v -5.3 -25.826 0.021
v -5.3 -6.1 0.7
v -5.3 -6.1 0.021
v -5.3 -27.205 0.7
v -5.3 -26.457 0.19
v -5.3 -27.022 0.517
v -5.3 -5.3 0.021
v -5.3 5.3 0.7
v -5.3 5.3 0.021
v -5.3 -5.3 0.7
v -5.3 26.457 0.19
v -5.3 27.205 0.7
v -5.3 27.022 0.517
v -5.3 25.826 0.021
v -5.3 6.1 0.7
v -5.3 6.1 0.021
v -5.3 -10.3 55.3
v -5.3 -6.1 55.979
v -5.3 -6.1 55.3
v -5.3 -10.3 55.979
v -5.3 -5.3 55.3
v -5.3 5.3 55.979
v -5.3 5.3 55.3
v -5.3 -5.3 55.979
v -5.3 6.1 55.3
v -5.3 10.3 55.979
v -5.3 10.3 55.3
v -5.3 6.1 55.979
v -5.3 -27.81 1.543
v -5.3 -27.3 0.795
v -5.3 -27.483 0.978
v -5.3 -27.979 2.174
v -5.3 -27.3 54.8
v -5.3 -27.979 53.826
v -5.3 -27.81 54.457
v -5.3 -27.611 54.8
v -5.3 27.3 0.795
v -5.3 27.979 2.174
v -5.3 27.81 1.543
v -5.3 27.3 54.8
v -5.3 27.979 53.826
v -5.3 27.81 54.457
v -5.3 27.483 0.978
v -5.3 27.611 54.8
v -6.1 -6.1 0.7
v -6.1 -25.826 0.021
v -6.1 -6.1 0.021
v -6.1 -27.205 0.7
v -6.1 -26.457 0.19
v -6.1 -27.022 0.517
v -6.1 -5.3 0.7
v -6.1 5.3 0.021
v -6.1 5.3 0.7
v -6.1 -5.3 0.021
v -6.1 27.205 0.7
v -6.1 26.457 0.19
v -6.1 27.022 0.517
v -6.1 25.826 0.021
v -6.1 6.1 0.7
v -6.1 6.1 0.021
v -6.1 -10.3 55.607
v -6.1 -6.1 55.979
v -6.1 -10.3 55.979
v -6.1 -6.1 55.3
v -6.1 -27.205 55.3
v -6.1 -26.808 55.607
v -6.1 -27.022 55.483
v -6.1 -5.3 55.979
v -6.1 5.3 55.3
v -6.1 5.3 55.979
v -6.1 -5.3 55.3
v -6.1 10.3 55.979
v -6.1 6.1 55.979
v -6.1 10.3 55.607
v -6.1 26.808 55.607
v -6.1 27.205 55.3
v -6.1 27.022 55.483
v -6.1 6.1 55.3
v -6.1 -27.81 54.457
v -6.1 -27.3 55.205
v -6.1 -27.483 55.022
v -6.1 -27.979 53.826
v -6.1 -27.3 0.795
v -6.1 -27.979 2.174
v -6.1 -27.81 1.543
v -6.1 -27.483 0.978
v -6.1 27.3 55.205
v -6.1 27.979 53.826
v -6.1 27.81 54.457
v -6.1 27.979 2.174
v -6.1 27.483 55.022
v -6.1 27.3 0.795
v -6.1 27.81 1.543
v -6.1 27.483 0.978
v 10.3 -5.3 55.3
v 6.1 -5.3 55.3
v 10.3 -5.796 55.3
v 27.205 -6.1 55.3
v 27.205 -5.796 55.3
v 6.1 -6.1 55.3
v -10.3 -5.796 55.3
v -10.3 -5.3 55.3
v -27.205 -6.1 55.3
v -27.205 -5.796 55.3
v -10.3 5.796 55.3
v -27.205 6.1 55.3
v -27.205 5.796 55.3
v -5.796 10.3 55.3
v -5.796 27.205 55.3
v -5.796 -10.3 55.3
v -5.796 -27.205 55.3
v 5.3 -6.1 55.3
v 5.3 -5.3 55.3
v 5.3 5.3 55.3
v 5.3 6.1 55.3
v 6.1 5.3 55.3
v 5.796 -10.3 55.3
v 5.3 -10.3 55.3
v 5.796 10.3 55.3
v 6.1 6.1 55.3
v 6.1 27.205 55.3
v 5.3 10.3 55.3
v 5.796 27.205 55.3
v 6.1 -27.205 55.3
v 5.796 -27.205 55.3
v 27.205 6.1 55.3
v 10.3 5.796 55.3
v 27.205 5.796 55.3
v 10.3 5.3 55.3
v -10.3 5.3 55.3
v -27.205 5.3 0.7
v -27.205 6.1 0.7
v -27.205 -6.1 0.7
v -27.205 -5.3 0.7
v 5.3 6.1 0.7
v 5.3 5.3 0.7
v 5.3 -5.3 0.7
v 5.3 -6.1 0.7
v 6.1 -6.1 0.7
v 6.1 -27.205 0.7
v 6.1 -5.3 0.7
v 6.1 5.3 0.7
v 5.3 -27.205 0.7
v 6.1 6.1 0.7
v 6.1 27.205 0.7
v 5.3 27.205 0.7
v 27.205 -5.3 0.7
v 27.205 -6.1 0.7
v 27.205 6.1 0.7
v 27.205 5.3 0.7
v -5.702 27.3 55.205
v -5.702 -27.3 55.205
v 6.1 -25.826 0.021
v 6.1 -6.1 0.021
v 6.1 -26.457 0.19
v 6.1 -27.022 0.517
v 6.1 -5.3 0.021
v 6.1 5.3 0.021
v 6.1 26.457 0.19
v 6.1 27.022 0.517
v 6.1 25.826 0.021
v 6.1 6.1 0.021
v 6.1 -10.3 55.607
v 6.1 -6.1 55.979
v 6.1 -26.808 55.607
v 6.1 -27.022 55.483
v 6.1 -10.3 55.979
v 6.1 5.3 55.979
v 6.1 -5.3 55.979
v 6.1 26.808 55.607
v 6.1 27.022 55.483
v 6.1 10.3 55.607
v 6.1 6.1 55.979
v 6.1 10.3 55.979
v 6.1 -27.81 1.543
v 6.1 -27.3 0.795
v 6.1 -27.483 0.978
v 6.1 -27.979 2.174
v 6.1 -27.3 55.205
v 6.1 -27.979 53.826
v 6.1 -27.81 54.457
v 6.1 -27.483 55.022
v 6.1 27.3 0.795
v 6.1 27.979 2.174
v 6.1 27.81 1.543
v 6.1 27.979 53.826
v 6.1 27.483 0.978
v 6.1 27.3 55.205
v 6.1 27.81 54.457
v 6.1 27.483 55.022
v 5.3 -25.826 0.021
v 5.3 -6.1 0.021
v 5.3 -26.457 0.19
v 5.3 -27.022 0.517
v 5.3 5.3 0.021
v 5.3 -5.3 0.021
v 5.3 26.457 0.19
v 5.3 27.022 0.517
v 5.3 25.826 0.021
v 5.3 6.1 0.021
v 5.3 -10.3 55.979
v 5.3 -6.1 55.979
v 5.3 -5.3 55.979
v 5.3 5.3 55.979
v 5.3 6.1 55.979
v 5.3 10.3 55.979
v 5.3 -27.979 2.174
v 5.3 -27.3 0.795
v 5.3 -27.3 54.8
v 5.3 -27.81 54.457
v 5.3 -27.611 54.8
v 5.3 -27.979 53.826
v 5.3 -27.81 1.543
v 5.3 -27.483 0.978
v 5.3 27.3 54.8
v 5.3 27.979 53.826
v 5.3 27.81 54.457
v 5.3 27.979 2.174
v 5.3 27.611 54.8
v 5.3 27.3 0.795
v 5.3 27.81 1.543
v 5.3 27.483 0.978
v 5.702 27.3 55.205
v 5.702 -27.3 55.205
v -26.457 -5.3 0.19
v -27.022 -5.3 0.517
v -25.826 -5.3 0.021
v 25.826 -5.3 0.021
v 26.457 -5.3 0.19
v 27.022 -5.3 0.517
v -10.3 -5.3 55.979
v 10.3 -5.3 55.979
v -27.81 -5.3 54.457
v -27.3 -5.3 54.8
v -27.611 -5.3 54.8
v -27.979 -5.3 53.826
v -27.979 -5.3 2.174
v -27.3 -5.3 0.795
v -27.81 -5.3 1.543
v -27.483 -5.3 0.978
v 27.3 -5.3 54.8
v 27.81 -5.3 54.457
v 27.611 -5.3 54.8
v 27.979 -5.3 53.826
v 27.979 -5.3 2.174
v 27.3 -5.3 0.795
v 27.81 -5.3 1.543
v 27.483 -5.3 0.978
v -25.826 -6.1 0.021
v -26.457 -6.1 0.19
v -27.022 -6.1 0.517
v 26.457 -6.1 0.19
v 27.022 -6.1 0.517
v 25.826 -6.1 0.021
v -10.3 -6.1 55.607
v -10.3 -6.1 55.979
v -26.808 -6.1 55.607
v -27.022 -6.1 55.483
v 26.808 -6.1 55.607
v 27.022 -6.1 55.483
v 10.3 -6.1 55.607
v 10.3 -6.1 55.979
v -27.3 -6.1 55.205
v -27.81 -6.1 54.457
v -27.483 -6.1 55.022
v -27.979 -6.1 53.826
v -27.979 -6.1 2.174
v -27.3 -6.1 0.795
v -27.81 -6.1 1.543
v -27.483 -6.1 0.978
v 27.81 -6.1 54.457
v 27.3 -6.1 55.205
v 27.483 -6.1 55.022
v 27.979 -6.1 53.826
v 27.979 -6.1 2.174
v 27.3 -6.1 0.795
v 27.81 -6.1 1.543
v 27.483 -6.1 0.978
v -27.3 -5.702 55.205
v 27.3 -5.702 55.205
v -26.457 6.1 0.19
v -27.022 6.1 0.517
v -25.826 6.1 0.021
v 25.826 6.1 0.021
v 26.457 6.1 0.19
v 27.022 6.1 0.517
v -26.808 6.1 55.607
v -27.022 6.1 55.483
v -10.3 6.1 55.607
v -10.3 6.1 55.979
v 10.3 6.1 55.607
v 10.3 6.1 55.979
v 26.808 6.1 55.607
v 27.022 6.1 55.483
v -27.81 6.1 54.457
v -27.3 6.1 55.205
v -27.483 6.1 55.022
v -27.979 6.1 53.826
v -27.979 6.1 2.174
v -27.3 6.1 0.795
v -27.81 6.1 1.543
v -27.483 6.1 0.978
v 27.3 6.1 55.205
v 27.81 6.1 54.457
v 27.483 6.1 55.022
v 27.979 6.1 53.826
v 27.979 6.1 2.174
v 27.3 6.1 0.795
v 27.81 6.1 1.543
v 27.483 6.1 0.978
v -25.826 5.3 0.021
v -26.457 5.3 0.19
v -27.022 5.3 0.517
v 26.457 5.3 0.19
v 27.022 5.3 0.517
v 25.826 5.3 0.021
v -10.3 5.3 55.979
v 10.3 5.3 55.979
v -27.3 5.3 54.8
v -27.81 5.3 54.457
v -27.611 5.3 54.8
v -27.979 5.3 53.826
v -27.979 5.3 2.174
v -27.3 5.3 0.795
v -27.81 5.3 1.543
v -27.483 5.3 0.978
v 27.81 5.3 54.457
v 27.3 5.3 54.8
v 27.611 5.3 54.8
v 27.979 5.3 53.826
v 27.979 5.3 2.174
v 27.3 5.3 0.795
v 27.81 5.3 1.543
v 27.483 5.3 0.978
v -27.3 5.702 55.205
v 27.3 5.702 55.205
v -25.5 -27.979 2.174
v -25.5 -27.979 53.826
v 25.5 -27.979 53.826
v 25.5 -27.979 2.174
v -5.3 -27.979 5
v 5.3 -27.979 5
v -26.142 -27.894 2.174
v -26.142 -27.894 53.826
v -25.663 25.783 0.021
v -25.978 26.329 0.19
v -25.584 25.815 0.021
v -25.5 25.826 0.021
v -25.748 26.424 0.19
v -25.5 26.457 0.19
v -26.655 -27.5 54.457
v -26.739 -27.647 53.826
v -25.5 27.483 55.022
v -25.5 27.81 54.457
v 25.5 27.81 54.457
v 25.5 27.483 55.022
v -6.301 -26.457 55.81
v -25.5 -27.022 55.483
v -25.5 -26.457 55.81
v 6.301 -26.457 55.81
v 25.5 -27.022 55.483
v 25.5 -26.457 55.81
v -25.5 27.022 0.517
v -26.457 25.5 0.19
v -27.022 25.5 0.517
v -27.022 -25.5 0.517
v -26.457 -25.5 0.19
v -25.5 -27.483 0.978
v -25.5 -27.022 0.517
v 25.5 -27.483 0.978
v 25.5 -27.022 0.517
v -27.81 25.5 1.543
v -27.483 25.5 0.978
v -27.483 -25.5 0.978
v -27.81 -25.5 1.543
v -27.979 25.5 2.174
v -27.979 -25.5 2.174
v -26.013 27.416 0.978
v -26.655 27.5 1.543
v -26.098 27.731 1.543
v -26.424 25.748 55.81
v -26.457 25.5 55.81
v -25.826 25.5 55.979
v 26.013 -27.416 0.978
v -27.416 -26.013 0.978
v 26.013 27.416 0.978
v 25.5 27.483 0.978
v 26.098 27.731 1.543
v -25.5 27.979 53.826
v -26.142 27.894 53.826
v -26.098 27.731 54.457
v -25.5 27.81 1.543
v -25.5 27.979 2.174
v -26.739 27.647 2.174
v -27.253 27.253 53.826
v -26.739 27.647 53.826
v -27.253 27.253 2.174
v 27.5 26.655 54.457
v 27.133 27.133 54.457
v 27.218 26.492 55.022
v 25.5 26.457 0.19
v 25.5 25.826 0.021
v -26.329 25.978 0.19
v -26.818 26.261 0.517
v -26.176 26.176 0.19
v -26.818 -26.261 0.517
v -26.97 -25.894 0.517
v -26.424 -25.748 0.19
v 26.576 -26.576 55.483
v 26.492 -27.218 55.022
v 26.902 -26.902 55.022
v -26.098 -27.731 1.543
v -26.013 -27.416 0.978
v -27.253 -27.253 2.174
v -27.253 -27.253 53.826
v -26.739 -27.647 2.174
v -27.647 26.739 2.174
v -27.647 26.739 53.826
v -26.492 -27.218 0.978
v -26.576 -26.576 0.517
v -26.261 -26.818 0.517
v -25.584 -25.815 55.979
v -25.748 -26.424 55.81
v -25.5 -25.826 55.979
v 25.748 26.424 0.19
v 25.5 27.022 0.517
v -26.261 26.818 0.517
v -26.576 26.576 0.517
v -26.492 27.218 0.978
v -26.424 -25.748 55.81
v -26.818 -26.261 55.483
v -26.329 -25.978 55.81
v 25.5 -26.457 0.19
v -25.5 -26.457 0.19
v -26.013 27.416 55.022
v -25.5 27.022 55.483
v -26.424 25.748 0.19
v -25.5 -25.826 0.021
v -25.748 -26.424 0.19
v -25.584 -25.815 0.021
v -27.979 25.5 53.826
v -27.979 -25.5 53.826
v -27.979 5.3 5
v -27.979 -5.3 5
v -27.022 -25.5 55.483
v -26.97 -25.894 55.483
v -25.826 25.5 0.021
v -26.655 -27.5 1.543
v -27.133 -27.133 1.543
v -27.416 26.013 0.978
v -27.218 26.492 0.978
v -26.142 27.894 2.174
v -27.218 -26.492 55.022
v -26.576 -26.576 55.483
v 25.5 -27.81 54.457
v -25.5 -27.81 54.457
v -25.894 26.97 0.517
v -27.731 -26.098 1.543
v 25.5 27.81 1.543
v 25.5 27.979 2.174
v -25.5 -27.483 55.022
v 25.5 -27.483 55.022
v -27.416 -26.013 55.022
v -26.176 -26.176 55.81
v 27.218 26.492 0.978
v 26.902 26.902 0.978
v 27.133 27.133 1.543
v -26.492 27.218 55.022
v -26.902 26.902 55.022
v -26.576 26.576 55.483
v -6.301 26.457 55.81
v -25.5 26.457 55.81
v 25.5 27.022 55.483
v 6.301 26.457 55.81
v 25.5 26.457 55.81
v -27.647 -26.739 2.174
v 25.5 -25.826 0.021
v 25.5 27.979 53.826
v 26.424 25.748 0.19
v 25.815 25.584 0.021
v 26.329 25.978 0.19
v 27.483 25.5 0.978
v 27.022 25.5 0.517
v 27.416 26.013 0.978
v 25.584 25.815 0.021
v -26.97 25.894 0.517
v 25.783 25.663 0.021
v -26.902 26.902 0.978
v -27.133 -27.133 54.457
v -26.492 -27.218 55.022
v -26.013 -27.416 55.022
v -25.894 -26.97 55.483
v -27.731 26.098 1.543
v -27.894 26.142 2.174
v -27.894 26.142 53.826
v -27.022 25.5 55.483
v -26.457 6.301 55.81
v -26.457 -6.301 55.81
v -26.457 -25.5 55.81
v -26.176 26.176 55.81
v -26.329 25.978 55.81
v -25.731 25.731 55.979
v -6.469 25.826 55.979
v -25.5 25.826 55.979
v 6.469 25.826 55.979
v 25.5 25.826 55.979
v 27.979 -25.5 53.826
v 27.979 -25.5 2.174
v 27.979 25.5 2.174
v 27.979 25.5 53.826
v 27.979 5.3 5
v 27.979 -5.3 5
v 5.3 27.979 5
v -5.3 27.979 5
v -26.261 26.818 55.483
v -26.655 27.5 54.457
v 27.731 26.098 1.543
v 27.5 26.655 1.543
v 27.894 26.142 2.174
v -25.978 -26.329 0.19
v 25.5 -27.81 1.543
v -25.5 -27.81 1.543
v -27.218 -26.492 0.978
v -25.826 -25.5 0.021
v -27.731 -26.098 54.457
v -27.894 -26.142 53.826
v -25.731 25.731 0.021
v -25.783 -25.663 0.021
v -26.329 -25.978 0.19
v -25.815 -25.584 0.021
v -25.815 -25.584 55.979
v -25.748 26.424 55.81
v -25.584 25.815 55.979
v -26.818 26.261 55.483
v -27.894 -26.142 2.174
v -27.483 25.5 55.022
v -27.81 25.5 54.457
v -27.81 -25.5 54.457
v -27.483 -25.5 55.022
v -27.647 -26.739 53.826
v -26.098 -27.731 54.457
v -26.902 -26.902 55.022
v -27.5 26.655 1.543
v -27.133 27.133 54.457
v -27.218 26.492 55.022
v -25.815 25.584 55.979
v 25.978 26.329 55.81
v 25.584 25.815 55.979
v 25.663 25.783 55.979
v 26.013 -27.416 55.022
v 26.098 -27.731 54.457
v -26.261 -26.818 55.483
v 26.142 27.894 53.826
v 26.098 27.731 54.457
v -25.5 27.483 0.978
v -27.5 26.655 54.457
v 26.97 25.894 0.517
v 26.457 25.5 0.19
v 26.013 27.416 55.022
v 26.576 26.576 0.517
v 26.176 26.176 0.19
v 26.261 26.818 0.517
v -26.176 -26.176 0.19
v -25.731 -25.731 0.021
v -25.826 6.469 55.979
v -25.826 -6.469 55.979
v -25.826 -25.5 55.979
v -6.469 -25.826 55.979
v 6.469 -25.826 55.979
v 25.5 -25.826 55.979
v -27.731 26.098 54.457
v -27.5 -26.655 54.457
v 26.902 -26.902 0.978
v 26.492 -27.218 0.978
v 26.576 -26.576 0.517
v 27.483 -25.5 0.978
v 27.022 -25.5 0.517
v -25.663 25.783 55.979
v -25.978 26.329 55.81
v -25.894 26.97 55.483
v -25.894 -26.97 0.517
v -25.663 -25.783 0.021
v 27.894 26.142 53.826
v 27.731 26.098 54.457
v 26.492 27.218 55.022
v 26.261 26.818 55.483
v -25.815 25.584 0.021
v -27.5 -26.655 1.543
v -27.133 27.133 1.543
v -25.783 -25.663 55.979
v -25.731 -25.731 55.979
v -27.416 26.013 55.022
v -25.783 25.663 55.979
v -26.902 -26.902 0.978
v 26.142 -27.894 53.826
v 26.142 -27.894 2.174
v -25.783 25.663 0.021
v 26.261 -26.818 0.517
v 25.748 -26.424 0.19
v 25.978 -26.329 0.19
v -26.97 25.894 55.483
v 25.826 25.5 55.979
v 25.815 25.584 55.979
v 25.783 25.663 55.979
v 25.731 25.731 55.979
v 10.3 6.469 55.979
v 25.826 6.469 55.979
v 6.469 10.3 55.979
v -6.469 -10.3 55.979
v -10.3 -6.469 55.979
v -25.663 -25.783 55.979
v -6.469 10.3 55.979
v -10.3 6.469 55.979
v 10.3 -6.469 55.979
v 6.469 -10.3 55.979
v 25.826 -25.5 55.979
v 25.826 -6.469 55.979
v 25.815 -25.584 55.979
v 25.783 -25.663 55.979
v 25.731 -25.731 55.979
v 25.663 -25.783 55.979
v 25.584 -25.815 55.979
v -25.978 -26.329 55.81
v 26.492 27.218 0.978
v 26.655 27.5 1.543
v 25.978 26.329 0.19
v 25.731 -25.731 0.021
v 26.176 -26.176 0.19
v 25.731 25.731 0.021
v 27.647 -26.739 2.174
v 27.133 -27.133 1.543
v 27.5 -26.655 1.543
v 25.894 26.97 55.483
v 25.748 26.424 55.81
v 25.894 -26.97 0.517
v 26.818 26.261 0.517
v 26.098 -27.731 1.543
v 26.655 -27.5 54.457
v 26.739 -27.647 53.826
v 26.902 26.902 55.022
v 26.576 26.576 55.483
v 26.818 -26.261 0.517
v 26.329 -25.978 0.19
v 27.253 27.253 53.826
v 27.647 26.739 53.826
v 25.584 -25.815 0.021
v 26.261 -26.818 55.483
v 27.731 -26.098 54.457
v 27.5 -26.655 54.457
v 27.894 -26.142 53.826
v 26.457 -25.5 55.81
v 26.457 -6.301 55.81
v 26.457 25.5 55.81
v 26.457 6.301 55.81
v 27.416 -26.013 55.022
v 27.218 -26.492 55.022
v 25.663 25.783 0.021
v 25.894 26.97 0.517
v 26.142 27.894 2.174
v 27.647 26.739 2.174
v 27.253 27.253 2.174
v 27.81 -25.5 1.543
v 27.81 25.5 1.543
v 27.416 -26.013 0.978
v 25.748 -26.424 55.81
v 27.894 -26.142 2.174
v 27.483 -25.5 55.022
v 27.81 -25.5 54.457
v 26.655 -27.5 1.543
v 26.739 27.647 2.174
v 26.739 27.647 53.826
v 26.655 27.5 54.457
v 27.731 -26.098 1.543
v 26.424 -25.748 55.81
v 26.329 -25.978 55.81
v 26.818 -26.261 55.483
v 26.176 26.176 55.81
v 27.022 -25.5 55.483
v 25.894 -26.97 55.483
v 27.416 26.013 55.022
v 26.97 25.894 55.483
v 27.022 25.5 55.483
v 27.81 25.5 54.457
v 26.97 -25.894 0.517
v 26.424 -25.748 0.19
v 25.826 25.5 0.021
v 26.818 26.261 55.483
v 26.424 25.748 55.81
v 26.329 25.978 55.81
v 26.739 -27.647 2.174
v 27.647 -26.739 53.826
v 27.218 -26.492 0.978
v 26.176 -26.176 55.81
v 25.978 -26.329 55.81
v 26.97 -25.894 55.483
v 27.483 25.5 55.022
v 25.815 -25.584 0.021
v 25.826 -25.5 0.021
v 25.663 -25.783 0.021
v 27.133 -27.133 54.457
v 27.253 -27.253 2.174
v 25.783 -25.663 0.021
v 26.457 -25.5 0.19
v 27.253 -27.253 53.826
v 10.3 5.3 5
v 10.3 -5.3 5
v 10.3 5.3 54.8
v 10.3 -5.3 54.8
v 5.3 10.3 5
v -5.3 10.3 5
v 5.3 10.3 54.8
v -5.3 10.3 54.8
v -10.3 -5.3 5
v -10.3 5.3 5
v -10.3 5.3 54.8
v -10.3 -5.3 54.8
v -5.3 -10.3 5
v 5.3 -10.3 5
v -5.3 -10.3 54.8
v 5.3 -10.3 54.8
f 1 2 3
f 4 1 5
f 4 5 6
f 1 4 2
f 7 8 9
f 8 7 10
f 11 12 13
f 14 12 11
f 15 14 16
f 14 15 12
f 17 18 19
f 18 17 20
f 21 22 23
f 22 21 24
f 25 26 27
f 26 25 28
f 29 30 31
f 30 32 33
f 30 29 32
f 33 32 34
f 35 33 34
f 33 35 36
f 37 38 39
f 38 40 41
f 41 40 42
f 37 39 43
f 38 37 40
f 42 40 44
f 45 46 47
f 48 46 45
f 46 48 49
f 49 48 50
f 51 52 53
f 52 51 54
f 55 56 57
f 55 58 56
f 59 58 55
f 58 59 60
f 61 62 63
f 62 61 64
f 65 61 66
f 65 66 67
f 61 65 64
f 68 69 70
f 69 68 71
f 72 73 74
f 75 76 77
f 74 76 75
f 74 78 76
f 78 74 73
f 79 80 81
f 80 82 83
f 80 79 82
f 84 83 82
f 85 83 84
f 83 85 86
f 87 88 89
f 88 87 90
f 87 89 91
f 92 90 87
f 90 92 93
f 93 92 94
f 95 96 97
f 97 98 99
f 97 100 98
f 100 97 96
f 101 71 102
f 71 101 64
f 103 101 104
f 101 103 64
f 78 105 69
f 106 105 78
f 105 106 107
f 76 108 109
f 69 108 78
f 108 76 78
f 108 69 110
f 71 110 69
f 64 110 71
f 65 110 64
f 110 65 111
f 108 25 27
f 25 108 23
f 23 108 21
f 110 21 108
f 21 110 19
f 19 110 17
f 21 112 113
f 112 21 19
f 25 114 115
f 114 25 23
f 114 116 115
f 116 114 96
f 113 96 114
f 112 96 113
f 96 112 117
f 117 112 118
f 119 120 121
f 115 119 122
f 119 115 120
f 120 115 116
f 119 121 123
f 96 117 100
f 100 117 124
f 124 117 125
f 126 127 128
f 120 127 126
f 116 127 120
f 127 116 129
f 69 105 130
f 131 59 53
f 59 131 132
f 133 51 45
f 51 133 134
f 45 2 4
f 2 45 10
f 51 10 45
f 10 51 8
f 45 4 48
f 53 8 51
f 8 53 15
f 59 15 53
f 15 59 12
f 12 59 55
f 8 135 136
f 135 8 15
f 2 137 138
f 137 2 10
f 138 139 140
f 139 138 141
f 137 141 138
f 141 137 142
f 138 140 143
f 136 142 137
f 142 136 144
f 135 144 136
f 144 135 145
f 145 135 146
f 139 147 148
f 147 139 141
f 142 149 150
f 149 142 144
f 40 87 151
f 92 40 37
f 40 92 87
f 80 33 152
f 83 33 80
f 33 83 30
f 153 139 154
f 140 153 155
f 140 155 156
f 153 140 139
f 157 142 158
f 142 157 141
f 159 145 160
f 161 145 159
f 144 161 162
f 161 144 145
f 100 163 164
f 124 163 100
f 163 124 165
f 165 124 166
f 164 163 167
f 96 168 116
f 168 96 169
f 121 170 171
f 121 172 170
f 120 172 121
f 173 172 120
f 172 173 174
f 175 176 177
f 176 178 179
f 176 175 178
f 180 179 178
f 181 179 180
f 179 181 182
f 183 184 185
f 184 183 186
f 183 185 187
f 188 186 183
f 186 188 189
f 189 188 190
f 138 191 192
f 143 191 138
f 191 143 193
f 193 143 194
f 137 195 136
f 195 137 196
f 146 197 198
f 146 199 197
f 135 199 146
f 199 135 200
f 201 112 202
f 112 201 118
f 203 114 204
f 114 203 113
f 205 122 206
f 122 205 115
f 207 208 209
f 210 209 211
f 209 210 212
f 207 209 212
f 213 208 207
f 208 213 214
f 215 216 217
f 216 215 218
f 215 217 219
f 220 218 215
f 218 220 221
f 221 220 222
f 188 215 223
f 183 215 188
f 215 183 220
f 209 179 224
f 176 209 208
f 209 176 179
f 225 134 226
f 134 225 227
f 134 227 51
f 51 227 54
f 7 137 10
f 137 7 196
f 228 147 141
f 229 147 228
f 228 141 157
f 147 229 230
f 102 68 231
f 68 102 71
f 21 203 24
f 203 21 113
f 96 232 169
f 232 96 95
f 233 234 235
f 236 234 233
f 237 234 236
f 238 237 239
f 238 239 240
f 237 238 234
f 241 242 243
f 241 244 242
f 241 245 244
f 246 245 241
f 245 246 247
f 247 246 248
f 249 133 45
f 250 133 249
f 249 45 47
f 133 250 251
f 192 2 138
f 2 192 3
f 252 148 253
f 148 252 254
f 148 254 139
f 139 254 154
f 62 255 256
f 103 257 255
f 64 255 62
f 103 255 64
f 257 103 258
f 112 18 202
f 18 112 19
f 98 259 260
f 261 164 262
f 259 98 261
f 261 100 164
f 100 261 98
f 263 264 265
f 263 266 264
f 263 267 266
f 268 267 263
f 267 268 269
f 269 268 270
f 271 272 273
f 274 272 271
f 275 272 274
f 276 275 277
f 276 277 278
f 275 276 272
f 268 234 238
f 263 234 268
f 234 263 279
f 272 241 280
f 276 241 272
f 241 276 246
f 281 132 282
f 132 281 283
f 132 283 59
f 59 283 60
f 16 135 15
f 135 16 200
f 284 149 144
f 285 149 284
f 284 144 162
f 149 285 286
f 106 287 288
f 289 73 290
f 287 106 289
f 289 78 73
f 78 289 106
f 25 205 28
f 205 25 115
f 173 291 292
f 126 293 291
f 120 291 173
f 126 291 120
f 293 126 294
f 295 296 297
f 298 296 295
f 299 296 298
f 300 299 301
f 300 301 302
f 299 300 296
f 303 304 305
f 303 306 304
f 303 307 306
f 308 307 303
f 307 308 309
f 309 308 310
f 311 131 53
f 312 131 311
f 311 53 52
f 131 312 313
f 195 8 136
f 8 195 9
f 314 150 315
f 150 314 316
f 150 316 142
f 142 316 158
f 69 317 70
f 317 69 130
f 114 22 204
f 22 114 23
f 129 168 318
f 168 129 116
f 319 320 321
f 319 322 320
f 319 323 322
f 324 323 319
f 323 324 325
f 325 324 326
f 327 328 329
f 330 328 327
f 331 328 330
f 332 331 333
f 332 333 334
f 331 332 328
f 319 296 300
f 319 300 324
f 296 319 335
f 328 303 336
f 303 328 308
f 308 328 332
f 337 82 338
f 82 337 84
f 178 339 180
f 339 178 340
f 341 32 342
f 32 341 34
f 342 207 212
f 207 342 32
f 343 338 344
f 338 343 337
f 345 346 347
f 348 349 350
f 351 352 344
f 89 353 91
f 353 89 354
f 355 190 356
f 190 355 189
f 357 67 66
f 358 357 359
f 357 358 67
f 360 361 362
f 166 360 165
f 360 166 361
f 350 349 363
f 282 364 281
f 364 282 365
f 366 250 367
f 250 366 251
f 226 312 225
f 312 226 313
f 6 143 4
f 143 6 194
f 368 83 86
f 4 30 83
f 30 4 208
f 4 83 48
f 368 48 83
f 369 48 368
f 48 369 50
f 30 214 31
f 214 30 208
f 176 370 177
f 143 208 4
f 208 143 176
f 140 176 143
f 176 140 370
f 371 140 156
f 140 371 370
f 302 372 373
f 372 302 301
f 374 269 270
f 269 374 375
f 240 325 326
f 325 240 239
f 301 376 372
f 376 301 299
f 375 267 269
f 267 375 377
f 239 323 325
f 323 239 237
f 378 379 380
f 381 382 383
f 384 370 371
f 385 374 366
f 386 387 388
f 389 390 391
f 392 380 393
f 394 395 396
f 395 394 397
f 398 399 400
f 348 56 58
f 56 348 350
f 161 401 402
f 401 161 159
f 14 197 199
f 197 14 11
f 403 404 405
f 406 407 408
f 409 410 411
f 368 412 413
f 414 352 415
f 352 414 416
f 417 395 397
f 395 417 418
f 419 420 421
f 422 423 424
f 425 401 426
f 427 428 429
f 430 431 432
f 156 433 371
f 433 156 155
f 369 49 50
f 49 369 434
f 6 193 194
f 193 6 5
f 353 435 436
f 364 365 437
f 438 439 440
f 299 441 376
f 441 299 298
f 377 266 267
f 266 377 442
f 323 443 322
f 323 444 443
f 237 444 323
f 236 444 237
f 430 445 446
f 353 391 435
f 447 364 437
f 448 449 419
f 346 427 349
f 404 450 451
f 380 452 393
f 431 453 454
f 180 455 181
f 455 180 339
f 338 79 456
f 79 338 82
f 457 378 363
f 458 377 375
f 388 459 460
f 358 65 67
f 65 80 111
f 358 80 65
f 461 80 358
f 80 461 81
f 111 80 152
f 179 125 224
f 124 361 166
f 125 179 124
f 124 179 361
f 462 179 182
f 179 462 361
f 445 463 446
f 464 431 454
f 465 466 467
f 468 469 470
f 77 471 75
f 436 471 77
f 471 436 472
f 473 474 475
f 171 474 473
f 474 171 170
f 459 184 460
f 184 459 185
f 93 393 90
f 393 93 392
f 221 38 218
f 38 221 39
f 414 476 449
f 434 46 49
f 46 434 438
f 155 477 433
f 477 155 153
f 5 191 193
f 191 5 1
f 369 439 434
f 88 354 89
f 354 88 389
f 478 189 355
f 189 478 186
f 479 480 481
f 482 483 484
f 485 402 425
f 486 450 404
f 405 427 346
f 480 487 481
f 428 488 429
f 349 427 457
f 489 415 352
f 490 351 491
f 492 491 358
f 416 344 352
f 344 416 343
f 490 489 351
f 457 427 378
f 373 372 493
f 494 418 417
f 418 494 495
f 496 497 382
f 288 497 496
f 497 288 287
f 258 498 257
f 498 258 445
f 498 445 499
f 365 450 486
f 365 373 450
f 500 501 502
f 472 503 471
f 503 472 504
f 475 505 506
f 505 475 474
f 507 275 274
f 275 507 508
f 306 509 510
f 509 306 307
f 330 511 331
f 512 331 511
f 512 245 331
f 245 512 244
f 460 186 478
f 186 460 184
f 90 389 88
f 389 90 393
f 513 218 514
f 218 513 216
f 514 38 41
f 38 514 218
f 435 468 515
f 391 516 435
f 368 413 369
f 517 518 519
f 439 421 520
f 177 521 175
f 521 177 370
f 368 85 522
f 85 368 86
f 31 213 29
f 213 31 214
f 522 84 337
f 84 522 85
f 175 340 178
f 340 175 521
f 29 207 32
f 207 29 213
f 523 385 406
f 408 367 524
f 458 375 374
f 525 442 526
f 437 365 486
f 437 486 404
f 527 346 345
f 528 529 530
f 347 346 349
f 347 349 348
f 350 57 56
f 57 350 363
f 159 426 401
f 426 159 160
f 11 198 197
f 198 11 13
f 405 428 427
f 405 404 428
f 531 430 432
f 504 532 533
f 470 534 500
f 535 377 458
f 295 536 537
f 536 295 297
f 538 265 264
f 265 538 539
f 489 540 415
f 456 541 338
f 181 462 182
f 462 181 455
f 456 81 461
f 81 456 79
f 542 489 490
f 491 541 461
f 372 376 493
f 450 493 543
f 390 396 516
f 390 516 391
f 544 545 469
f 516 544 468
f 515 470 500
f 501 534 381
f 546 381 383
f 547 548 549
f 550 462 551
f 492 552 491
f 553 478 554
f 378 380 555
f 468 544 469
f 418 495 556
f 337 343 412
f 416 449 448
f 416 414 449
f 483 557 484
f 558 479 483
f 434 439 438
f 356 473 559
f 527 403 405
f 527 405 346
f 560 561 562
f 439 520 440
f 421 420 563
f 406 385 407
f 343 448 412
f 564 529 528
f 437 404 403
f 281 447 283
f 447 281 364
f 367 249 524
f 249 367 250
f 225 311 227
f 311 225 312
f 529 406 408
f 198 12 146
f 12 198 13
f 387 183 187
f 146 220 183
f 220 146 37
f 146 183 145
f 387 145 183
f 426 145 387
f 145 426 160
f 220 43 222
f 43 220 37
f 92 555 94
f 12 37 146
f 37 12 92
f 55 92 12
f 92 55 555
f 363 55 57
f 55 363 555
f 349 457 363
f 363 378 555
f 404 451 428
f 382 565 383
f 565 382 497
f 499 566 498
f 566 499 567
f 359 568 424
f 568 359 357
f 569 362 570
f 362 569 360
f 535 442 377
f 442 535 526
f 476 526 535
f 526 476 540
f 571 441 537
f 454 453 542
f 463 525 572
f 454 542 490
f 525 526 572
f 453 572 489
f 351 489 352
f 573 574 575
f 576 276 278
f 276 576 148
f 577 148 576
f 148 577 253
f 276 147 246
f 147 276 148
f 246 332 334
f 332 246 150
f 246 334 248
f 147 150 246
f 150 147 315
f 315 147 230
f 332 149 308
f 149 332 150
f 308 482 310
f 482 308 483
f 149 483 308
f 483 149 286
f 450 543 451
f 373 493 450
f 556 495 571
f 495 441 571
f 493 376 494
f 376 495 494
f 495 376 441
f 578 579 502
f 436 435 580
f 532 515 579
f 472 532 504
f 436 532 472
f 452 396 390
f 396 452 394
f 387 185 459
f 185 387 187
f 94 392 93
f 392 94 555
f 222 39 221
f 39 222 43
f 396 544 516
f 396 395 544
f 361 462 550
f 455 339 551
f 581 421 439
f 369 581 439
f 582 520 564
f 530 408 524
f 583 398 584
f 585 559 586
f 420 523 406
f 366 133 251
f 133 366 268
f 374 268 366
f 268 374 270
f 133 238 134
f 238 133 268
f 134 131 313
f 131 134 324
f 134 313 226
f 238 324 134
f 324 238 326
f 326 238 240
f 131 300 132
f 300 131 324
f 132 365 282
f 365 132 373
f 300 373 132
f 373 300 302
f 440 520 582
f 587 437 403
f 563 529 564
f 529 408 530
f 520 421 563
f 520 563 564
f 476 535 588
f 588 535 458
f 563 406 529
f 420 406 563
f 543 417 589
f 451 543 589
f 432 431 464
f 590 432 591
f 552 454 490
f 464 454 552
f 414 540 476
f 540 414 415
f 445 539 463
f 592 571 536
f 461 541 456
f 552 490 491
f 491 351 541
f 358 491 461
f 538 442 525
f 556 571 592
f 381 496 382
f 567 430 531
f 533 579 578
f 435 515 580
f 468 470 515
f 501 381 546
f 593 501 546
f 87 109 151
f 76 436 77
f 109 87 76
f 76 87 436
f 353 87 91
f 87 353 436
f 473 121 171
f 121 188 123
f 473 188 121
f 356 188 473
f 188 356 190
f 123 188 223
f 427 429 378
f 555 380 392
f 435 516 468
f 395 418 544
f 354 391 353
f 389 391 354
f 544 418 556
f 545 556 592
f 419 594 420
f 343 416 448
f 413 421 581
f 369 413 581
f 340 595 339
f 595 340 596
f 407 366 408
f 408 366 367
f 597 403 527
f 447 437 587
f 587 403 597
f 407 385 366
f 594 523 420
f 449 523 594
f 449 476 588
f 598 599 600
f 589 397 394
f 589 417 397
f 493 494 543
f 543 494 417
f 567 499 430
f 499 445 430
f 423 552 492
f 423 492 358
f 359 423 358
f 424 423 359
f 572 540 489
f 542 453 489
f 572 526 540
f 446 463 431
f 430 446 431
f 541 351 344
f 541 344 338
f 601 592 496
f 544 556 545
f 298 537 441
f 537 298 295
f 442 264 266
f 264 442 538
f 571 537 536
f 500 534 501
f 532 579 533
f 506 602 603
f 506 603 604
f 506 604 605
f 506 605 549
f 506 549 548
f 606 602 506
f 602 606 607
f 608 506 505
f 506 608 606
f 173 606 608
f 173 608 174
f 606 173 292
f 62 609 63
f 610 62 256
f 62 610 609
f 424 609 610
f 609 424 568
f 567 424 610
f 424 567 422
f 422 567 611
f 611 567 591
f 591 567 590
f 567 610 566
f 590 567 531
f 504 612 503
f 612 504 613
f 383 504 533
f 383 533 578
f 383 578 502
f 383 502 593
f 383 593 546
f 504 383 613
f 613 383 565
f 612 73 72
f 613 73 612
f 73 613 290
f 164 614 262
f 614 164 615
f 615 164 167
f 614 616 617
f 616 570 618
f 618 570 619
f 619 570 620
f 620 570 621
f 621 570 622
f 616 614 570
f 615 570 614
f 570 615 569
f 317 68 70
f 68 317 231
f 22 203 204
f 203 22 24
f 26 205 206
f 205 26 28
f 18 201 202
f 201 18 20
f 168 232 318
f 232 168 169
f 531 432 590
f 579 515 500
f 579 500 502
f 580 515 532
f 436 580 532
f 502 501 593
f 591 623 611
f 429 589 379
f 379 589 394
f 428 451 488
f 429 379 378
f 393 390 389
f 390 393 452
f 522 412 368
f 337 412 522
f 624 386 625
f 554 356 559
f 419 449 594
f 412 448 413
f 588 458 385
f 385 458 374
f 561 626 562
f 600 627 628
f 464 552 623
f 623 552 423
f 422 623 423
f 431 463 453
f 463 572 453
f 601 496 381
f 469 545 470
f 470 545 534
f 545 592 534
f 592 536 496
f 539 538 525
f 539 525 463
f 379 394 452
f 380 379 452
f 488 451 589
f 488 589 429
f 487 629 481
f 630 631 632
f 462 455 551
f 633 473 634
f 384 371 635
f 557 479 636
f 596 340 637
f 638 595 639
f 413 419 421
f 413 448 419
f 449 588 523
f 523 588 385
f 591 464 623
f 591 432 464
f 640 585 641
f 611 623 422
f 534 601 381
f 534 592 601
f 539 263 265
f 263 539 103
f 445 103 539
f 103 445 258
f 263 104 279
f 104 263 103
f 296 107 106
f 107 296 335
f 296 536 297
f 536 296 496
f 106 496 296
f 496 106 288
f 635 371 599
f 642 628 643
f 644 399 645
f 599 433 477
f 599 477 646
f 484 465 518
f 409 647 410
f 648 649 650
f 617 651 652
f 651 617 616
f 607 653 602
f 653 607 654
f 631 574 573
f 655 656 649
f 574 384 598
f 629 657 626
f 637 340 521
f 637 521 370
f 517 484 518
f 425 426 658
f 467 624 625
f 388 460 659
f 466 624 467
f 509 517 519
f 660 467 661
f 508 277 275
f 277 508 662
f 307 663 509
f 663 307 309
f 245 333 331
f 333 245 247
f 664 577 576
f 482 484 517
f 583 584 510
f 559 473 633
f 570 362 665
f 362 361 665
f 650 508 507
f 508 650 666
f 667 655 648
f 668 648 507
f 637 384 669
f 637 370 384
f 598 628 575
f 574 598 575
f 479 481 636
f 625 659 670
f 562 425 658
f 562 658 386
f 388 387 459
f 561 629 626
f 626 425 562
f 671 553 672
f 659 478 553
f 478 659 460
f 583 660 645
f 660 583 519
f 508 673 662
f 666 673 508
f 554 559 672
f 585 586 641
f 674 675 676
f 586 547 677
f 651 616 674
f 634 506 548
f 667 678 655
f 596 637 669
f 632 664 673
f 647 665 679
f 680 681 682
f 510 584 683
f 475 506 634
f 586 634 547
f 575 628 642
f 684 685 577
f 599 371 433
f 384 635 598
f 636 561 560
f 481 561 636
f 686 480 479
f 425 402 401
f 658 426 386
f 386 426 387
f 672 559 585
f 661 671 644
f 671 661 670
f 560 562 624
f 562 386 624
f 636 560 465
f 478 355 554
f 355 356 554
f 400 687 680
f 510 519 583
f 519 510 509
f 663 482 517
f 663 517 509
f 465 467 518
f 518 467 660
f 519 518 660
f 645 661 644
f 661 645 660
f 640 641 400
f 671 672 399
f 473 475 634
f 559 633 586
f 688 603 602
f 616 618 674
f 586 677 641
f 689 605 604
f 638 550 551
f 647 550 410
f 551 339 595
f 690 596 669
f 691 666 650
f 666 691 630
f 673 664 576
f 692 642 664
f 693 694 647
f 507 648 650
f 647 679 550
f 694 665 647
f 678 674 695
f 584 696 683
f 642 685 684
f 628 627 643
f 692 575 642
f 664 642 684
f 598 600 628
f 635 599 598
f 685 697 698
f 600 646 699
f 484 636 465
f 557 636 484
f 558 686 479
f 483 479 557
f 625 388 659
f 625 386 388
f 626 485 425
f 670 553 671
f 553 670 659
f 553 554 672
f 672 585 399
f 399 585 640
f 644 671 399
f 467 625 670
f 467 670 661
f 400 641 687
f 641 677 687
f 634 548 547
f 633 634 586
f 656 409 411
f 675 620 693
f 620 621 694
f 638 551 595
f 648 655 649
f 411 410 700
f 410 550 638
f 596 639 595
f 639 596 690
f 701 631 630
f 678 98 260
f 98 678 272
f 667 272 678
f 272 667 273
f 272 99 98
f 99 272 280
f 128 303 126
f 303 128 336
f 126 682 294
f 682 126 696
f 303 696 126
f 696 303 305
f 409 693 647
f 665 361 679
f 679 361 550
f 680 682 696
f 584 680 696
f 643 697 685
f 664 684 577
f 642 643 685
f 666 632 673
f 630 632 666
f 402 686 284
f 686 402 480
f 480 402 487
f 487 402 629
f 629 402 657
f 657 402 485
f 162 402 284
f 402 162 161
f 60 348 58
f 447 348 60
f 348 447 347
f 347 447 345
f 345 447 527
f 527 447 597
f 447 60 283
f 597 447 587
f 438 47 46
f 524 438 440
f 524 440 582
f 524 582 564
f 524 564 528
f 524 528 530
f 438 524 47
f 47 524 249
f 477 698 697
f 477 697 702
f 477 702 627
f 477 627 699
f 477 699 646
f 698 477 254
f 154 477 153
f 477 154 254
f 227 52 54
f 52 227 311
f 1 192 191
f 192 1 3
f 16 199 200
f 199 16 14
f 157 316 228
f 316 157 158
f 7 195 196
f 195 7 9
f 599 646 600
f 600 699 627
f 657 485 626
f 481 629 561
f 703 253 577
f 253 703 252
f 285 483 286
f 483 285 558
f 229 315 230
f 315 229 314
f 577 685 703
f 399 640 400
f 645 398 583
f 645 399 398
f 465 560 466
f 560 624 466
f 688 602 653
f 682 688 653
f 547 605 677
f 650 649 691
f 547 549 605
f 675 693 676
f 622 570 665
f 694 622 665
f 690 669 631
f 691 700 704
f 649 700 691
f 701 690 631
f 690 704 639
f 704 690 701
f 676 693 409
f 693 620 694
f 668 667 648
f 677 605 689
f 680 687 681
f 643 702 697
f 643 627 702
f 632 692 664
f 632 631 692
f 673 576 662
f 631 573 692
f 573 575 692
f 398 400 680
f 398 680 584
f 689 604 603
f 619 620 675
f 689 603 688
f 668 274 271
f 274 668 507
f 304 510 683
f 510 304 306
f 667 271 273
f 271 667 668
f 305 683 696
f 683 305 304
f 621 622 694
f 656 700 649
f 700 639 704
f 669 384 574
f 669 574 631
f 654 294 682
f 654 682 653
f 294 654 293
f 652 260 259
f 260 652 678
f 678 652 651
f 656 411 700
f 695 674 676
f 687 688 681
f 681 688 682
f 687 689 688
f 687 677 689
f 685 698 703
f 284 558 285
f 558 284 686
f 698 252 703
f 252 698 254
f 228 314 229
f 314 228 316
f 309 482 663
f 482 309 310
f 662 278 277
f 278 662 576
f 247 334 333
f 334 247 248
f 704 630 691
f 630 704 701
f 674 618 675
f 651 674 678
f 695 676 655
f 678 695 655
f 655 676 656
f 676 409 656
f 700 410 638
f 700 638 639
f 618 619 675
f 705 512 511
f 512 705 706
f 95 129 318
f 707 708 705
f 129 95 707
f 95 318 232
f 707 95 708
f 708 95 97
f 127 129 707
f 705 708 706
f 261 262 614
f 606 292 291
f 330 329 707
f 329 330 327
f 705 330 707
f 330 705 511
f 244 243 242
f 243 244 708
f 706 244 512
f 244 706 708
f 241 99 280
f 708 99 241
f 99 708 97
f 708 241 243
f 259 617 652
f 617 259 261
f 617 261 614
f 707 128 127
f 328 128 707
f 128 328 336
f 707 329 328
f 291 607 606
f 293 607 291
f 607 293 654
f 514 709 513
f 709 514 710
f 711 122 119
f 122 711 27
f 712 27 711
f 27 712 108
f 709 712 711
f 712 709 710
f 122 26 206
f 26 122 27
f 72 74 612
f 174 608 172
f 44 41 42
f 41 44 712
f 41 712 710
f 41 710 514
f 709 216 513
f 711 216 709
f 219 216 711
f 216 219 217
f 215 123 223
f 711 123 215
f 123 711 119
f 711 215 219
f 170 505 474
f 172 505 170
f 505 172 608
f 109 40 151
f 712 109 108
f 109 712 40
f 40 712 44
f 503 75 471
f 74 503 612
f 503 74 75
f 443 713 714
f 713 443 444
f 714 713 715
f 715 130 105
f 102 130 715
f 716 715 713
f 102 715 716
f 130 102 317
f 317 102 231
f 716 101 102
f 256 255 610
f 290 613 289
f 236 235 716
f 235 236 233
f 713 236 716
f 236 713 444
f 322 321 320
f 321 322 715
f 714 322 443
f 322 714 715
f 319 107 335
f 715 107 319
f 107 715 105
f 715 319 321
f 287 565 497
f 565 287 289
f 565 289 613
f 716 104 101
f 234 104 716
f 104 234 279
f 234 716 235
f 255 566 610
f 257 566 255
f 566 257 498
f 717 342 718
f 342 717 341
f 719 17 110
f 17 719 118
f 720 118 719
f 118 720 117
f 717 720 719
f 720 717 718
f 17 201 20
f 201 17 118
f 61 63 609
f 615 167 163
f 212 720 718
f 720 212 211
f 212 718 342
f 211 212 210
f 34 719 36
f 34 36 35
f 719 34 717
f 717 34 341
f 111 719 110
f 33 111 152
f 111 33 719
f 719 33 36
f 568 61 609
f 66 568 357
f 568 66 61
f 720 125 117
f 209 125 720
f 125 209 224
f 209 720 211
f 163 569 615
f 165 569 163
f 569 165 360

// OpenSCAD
// Конектор за шкафове от керамични плочки (параметричен)
// Плочките влизат в канали на куб или сфера; плътната челна стена ги спира
// да не излизат напред/назад. Един и същ детайл се ползва отпред и отзад.
//
// Печат: с челната (плоската) страна върху масата, без подпори.

/* [Плочка] */
// Дебелина на плочката (mm)
tile = 10;
// Хлабина в канала (mm) - увеличи, ако плочката не влиза
clearance = 0.6;

/* [Конектор] */
// Форма: "cube" куб, "sphere" сфера
shape = "cube"; // [cube, sphere]
// Тип: "L" ъгъл, "T" тройник, "X" кръст
type = "X"; // [L, T, X]
// Страна на куба (mm)
cube_size = 56;
// Диаметър на сферата (mm)
sphere_d = 70;
// Плътна стена около канала в центъра (mm)
wall = 5;
// Дебелина на челната стена (mm)
cap = 5;
// Радиус на заобляне на куба (mm)
round_r = 2.5;
// Фаска на входа на канала (mm)
lead = 1.2;
// Декоративни фуги по куба
grooves = true;

$fn = 64;

slot = tile + clearance;      // ширина на канала
core = slot + 2 * wall;       // плътно ядро, в което опират плочките
BIG = 200;

// ъгли на рамената за всеки тип
function arms(t) =
    t == "L" ? [0, 90] :
    t == "T" ? [0, 90, 180] :
               [0, 90, 180, 270];

function body_h(s) = s == "sphere" ? sphere_d / 2 * (1 + cos(45)) : cube_size;

// канал за една плочка: от ядрото навън, отворен към гърба
module slot_cut(h) {
    x0 = core / 2;
    translate([x0, -slot / 2, cap]) cube([BIG, slot, BIG]);
    // фаска на входа откъм гърба
    hull() {
        translate([x0, -slot / 2, h - lead]) cube([BIG, slot, 0.01]);
        translate([x0, -slot / 2 - lead, h + 0.01]) cube([BIG, slot + 2 * lead, 0.01]);
    }
}

module cube_body() {
    s = cube_size; r = round_r;
    difference() {
        hull() for (x = [-1, 1], y = [-1, 1], z = [r, s - r])
            translate([x * (s / 2 - r), y * (s / 2 - r), z]) sphere(r, $fn = 24);
        if (grooves) for (a = [0, 90]) rotate(a) for (m = [-1, 1])
            translate([m * (slot / 2 + 0.4), 0, s / 2]) difference() {
                cube([0.8, s + 2, s + 2], center = true);
                cube([1, s - 1.4, s - 1.4], center = true);
            }
    }
}

module sphere_body() {
    r = sphere_d / 2;
    // отрязана под 45 градуса, за да стъпва плоско на масата без подпори
    intersection() {
        translate([0, 0, r * cos(45)]) sphere(r, $fn = 96);
        translate([0, 0, BIG / 2]) cube(BIG, center = true);
    }
}

// a = списък с ъгли на каналите (0 = +X, 90 = +Y ...)
module connector_arms(a, s = shape) {
    difference() {
        if (s == "sphere") sphere_body(); else cube_body();
        for (ang = a) rotate(ang) slot_cut(body_h(s));
    }
}

module connector(t = type, s = shape) connector_arms(arms(t), s);

connector();
